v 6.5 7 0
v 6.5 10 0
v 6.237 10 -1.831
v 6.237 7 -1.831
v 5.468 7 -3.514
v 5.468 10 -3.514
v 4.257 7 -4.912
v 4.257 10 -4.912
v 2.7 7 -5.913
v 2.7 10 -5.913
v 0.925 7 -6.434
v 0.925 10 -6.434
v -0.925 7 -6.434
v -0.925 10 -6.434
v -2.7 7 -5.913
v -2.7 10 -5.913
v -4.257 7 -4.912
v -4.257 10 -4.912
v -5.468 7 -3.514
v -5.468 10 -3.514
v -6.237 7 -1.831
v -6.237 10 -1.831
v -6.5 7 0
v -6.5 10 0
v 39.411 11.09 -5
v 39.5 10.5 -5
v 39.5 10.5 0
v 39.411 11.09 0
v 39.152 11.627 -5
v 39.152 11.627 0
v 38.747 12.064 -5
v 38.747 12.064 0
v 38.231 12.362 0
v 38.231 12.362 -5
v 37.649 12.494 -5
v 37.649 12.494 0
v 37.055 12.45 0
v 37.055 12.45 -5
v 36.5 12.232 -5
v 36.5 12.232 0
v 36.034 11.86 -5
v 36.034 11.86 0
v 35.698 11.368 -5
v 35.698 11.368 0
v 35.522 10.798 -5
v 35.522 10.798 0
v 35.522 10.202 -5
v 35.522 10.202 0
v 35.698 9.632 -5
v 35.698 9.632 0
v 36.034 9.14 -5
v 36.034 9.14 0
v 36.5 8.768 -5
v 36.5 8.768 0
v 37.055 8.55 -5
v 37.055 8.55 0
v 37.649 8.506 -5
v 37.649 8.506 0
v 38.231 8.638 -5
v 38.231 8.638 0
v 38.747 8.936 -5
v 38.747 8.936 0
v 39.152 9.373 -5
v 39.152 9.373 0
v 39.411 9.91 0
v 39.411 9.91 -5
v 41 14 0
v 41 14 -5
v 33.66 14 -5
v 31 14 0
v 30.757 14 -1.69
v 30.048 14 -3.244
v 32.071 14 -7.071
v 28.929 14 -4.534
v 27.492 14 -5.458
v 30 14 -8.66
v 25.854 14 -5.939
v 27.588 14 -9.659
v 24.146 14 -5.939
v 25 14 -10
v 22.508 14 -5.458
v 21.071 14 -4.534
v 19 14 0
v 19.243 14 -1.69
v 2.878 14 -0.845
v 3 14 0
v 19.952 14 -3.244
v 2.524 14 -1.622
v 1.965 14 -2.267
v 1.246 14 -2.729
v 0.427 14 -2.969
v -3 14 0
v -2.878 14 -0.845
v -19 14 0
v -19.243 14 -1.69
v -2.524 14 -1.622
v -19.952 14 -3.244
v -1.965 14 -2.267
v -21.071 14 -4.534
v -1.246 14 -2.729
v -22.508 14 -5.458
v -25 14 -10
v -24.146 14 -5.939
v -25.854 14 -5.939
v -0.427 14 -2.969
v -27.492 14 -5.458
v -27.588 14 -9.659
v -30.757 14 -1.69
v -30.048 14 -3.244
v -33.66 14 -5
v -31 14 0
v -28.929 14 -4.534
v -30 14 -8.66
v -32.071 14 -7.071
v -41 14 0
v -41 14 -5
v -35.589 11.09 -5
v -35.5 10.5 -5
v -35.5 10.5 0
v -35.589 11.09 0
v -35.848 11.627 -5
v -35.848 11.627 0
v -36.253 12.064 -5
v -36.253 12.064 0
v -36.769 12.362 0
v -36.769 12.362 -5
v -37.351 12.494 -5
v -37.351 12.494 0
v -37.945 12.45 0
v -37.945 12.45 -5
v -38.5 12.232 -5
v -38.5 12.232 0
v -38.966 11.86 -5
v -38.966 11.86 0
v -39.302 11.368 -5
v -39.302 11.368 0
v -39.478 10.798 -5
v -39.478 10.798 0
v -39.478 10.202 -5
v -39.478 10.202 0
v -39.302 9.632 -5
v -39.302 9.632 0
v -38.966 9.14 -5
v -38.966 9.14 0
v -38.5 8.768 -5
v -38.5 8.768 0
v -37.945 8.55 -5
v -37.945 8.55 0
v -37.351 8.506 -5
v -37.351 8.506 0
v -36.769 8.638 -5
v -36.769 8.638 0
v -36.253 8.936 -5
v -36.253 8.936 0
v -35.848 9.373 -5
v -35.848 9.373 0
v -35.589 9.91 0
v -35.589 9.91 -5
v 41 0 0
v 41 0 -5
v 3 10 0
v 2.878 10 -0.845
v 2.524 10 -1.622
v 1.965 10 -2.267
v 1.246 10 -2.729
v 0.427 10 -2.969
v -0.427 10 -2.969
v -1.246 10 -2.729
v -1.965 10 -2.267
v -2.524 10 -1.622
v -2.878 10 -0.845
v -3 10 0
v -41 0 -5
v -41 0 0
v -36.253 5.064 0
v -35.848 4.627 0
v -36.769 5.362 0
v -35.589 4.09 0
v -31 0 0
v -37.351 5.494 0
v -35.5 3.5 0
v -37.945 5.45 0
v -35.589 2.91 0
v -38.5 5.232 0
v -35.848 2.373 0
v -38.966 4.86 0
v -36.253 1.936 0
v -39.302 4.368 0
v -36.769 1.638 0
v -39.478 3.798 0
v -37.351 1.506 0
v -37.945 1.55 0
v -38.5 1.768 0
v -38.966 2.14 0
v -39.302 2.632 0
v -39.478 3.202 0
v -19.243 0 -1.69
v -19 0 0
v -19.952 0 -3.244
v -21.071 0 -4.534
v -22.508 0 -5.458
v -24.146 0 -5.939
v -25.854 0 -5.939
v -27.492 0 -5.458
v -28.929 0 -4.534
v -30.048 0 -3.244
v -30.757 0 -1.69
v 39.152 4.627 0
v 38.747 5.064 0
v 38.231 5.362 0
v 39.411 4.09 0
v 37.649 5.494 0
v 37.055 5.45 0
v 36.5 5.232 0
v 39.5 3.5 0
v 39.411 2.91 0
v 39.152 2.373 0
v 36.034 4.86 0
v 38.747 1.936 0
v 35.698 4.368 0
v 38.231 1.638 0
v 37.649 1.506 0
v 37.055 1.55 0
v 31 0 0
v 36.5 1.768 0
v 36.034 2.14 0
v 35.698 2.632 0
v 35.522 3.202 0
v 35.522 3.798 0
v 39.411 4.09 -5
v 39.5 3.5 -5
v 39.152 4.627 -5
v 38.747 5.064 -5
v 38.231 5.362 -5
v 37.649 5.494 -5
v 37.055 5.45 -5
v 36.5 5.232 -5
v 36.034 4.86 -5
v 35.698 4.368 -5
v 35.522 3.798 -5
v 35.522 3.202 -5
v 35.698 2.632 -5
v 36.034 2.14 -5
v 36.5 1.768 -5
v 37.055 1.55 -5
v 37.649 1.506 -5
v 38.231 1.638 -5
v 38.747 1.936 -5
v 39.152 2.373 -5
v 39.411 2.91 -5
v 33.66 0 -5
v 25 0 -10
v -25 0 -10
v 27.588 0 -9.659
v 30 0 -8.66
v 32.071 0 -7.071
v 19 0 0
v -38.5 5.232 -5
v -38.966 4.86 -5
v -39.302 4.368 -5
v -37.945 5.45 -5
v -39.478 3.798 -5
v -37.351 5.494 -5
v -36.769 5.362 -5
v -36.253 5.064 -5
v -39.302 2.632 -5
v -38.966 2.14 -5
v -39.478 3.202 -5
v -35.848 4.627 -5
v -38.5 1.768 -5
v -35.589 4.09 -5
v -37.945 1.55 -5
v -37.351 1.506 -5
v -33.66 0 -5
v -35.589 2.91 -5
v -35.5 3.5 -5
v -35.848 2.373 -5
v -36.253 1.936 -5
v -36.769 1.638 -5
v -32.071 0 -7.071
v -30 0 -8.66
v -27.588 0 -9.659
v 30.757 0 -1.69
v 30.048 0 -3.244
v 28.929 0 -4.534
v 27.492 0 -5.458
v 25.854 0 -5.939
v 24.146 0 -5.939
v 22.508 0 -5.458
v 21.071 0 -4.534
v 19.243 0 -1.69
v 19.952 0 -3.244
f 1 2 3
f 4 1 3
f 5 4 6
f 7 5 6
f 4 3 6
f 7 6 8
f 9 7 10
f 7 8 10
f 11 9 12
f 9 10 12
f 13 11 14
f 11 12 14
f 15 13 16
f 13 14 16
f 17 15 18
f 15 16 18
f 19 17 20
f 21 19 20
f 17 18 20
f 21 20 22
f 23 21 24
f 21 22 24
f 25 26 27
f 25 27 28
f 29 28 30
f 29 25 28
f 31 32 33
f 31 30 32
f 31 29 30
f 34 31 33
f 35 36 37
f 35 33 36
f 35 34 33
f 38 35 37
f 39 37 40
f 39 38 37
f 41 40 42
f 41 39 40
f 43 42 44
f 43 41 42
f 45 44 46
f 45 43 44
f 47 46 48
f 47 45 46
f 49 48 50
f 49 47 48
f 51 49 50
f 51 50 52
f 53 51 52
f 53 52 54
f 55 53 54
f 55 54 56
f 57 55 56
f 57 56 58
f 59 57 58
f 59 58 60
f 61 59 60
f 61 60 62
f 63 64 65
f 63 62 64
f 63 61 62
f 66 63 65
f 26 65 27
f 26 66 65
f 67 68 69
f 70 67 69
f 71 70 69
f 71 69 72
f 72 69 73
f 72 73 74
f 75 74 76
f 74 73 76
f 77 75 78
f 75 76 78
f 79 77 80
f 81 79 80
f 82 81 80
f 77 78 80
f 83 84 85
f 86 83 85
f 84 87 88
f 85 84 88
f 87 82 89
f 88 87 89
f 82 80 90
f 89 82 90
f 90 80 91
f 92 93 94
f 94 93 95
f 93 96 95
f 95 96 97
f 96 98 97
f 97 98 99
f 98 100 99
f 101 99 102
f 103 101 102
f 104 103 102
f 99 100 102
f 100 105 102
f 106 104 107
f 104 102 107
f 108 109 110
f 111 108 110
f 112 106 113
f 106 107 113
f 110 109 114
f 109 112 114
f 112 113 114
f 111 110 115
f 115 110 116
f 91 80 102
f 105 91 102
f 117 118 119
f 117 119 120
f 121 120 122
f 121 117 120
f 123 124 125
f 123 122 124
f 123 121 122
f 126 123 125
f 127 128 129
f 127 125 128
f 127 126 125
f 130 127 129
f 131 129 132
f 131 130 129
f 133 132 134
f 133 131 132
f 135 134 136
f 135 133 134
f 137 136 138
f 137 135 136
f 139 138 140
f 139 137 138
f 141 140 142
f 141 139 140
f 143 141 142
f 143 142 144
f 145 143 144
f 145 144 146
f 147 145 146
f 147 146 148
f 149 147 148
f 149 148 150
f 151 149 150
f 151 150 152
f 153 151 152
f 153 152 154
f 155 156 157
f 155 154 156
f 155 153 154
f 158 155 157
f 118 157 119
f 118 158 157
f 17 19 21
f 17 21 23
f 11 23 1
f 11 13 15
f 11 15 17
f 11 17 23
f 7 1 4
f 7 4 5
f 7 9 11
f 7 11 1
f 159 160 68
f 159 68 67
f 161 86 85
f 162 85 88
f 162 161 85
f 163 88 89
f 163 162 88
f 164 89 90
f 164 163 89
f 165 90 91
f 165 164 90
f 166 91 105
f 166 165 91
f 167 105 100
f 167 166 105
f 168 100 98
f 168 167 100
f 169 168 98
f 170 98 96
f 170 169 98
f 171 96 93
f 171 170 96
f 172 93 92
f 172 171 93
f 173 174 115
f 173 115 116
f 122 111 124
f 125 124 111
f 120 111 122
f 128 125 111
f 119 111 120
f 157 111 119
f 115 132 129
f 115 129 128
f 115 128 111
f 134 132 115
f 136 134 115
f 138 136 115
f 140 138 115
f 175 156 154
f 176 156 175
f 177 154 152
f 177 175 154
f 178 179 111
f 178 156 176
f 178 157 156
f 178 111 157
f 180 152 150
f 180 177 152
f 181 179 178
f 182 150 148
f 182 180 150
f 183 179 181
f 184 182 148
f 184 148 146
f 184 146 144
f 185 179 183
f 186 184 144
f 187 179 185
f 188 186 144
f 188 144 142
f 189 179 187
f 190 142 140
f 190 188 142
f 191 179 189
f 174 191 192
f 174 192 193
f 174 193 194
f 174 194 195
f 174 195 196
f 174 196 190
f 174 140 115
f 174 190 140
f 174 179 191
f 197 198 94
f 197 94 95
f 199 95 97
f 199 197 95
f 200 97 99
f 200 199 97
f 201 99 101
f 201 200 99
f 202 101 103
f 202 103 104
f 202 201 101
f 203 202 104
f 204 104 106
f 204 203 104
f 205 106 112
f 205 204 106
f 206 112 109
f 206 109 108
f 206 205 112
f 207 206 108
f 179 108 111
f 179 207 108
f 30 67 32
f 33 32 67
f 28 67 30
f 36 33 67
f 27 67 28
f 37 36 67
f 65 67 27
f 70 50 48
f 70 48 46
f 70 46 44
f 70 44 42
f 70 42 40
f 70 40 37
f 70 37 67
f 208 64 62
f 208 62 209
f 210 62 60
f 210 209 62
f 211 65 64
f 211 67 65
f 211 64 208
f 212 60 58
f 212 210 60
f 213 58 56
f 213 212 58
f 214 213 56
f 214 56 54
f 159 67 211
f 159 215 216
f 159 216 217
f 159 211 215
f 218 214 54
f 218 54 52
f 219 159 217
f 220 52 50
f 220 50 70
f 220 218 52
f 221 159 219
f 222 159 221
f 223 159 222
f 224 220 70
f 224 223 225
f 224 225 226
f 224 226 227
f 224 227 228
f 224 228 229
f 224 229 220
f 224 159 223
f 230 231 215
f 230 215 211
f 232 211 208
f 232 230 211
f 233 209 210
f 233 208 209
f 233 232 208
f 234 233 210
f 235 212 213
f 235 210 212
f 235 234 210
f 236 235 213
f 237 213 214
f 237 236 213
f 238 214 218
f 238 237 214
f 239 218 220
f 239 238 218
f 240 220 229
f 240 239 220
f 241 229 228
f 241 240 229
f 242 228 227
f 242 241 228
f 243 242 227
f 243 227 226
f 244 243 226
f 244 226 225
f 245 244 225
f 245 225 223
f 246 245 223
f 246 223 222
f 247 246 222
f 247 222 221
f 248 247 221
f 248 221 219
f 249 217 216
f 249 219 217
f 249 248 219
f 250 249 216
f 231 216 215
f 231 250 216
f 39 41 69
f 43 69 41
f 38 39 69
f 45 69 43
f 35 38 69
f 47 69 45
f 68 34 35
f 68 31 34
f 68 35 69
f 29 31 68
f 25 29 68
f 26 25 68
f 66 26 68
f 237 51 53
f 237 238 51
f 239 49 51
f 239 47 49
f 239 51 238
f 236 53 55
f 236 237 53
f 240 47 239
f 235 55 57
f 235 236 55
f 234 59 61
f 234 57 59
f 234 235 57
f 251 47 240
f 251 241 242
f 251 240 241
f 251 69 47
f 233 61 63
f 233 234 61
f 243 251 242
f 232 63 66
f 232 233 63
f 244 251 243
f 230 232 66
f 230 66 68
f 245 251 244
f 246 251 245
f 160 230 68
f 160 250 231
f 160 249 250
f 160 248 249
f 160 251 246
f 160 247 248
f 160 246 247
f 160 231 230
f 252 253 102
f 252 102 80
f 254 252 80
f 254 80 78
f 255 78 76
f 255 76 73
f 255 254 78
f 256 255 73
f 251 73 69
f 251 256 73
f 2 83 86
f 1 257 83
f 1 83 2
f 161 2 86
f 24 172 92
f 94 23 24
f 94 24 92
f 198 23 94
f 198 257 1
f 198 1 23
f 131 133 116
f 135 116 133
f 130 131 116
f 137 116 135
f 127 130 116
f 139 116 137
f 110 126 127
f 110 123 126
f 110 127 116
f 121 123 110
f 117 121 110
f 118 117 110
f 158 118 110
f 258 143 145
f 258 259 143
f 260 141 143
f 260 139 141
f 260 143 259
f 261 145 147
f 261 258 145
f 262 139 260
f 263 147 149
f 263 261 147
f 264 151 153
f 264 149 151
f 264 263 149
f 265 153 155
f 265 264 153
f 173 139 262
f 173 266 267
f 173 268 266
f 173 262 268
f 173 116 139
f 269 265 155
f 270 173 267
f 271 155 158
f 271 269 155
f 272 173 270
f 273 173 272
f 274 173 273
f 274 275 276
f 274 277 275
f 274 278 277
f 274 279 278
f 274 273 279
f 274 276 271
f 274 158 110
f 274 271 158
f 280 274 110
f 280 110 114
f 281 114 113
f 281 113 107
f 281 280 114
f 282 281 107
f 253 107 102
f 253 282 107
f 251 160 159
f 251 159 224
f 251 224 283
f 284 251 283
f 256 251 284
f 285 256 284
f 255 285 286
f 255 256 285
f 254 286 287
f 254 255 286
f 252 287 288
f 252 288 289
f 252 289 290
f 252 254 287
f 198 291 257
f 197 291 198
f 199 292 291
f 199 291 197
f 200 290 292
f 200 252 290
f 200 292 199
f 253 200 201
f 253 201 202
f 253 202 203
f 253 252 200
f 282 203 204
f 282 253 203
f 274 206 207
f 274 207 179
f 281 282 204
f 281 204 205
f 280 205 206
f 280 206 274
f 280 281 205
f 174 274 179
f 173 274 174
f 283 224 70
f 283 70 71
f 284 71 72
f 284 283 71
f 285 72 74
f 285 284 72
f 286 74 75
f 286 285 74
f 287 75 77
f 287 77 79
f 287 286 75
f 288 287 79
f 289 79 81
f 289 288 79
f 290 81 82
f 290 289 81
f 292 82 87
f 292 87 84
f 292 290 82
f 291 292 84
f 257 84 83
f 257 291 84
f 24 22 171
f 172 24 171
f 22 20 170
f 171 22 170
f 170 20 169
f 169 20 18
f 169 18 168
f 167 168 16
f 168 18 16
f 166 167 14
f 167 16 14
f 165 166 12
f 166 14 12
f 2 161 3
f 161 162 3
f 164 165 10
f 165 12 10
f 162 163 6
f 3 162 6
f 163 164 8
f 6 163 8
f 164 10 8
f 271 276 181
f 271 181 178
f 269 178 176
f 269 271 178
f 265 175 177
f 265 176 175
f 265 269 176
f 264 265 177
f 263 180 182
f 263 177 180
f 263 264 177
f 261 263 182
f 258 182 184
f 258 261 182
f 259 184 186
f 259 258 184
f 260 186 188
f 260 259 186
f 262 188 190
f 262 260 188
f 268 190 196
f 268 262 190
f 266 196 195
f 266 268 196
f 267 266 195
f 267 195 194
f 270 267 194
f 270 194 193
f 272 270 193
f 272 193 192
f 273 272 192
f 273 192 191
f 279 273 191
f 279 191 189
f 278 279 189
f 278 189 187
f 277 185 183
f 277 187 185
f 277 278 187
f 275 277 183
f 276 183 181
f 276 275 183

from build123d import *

# Parameters (mm, degrees)
BOSS_EXTRUDE1_DEPTH     = 14
CUT_EXTRUDE1_DEPTH      = 45.463468151
CUT_EXTRUDE1_DEPTH_BACK = 45.463468151
SKETCH4_R               = 2
SKETCH5_W               = 9.30871577
SKETCH5_H               = 4.044371358
BOSS_EXTRUDE2_DEPTH     = 7
CUT_EXTRUDE2_START      = 1.5
SKETCH6_R               = 6.5
CUT_EXTRUDE2_DEPTH      = 1.5


with BuildPart() as part:
    # Sketch2 → Boss-Extrude1 (new body)
    with BuildSketch(Plane(origin=(0, 0, 0), x_dir=(1, 0, 0), z_dir=(0, 1, 0))):
        with BuildLine():
            Line((-3, 0), (-19, 0))
            ThreePointArc((-19, 0), (-25, 6), (-31, 0))
            Line((-31, 0), (-41, 0))
            Line((-41, 0), (-41, 5))
            Line((-41, 5), (-33.660254038, 5))
            ThreePointArc((-33.660254038, 5), (-30, 8.660254038), (-25, 10))
            Line((-25, 10), (25, 10))
            ThreePointArc((25, 10), (30, 8.660254038), (33.660254038, 5))
            Line((33.660254038, 5), (41, 5))
            Line((41, 5), (41, 0))
            Line((41, 0), (31, 0))
            ThreePointArc((31, 0), (25, 6), (19, 0))
            Line((19, 0), (3, 0))
            ThreePointArc((3, 0), (0, 3), (-3, 0))
        make_face()
    extrude(amount=BOSS_EXTRUDE1_DEPTH)

    # Sketch4 → Cut-Extrude1 (cut, two sides: drawn at the far end of the back side and taken through both)
    with BuildSketch(Plane.XY.offset(-CUT_EXTRUDE1_DEPTH_BACK)):
        with Locations((-37.5, 10.5)):
            Circle(SKETCH4_R)
        with Locations((-37.5, 3.5)):
            Circle(SKETCH4_R)
        with Locations((37.5, 10.5)):
            Circle(SKETCH4_R)
        with Locations((37.5, 3.5)):
            Circle(SKETCH4_R)
    extrude(amount=CUT_EXTRUDE1_DEPTH + CUT_EXTRUDE1_DEPTH_BACK, mode=Mode.SUBTRACT)

    # Sketch5 → Boss-Extrude2 (add)
    with BuildSketch(Plane.XZ):
        with Locations((-0.028958253, -2.022185679)):
            Rectangle(SKETCH5_W, SKETCH5_H)
    extrude(amount=-BOSS_EXTRUDE2_DEPTH)

    # Sketch6 → Cut-Extrude2 (cut, symmetric)
    with BuildSketch(Plane(origin=(0, 7, 0), x_dir=(1, 0, 0), z_dir=(0, 1, 0)).offset(CUT_EXTRUDE2_START)):
        Circle(SKETCH6_R)
    extrude(amount=CUT_EXTRUDE2_DEPTH, both=True, mode=Mode.SUBTRACT)


solid = part.part
